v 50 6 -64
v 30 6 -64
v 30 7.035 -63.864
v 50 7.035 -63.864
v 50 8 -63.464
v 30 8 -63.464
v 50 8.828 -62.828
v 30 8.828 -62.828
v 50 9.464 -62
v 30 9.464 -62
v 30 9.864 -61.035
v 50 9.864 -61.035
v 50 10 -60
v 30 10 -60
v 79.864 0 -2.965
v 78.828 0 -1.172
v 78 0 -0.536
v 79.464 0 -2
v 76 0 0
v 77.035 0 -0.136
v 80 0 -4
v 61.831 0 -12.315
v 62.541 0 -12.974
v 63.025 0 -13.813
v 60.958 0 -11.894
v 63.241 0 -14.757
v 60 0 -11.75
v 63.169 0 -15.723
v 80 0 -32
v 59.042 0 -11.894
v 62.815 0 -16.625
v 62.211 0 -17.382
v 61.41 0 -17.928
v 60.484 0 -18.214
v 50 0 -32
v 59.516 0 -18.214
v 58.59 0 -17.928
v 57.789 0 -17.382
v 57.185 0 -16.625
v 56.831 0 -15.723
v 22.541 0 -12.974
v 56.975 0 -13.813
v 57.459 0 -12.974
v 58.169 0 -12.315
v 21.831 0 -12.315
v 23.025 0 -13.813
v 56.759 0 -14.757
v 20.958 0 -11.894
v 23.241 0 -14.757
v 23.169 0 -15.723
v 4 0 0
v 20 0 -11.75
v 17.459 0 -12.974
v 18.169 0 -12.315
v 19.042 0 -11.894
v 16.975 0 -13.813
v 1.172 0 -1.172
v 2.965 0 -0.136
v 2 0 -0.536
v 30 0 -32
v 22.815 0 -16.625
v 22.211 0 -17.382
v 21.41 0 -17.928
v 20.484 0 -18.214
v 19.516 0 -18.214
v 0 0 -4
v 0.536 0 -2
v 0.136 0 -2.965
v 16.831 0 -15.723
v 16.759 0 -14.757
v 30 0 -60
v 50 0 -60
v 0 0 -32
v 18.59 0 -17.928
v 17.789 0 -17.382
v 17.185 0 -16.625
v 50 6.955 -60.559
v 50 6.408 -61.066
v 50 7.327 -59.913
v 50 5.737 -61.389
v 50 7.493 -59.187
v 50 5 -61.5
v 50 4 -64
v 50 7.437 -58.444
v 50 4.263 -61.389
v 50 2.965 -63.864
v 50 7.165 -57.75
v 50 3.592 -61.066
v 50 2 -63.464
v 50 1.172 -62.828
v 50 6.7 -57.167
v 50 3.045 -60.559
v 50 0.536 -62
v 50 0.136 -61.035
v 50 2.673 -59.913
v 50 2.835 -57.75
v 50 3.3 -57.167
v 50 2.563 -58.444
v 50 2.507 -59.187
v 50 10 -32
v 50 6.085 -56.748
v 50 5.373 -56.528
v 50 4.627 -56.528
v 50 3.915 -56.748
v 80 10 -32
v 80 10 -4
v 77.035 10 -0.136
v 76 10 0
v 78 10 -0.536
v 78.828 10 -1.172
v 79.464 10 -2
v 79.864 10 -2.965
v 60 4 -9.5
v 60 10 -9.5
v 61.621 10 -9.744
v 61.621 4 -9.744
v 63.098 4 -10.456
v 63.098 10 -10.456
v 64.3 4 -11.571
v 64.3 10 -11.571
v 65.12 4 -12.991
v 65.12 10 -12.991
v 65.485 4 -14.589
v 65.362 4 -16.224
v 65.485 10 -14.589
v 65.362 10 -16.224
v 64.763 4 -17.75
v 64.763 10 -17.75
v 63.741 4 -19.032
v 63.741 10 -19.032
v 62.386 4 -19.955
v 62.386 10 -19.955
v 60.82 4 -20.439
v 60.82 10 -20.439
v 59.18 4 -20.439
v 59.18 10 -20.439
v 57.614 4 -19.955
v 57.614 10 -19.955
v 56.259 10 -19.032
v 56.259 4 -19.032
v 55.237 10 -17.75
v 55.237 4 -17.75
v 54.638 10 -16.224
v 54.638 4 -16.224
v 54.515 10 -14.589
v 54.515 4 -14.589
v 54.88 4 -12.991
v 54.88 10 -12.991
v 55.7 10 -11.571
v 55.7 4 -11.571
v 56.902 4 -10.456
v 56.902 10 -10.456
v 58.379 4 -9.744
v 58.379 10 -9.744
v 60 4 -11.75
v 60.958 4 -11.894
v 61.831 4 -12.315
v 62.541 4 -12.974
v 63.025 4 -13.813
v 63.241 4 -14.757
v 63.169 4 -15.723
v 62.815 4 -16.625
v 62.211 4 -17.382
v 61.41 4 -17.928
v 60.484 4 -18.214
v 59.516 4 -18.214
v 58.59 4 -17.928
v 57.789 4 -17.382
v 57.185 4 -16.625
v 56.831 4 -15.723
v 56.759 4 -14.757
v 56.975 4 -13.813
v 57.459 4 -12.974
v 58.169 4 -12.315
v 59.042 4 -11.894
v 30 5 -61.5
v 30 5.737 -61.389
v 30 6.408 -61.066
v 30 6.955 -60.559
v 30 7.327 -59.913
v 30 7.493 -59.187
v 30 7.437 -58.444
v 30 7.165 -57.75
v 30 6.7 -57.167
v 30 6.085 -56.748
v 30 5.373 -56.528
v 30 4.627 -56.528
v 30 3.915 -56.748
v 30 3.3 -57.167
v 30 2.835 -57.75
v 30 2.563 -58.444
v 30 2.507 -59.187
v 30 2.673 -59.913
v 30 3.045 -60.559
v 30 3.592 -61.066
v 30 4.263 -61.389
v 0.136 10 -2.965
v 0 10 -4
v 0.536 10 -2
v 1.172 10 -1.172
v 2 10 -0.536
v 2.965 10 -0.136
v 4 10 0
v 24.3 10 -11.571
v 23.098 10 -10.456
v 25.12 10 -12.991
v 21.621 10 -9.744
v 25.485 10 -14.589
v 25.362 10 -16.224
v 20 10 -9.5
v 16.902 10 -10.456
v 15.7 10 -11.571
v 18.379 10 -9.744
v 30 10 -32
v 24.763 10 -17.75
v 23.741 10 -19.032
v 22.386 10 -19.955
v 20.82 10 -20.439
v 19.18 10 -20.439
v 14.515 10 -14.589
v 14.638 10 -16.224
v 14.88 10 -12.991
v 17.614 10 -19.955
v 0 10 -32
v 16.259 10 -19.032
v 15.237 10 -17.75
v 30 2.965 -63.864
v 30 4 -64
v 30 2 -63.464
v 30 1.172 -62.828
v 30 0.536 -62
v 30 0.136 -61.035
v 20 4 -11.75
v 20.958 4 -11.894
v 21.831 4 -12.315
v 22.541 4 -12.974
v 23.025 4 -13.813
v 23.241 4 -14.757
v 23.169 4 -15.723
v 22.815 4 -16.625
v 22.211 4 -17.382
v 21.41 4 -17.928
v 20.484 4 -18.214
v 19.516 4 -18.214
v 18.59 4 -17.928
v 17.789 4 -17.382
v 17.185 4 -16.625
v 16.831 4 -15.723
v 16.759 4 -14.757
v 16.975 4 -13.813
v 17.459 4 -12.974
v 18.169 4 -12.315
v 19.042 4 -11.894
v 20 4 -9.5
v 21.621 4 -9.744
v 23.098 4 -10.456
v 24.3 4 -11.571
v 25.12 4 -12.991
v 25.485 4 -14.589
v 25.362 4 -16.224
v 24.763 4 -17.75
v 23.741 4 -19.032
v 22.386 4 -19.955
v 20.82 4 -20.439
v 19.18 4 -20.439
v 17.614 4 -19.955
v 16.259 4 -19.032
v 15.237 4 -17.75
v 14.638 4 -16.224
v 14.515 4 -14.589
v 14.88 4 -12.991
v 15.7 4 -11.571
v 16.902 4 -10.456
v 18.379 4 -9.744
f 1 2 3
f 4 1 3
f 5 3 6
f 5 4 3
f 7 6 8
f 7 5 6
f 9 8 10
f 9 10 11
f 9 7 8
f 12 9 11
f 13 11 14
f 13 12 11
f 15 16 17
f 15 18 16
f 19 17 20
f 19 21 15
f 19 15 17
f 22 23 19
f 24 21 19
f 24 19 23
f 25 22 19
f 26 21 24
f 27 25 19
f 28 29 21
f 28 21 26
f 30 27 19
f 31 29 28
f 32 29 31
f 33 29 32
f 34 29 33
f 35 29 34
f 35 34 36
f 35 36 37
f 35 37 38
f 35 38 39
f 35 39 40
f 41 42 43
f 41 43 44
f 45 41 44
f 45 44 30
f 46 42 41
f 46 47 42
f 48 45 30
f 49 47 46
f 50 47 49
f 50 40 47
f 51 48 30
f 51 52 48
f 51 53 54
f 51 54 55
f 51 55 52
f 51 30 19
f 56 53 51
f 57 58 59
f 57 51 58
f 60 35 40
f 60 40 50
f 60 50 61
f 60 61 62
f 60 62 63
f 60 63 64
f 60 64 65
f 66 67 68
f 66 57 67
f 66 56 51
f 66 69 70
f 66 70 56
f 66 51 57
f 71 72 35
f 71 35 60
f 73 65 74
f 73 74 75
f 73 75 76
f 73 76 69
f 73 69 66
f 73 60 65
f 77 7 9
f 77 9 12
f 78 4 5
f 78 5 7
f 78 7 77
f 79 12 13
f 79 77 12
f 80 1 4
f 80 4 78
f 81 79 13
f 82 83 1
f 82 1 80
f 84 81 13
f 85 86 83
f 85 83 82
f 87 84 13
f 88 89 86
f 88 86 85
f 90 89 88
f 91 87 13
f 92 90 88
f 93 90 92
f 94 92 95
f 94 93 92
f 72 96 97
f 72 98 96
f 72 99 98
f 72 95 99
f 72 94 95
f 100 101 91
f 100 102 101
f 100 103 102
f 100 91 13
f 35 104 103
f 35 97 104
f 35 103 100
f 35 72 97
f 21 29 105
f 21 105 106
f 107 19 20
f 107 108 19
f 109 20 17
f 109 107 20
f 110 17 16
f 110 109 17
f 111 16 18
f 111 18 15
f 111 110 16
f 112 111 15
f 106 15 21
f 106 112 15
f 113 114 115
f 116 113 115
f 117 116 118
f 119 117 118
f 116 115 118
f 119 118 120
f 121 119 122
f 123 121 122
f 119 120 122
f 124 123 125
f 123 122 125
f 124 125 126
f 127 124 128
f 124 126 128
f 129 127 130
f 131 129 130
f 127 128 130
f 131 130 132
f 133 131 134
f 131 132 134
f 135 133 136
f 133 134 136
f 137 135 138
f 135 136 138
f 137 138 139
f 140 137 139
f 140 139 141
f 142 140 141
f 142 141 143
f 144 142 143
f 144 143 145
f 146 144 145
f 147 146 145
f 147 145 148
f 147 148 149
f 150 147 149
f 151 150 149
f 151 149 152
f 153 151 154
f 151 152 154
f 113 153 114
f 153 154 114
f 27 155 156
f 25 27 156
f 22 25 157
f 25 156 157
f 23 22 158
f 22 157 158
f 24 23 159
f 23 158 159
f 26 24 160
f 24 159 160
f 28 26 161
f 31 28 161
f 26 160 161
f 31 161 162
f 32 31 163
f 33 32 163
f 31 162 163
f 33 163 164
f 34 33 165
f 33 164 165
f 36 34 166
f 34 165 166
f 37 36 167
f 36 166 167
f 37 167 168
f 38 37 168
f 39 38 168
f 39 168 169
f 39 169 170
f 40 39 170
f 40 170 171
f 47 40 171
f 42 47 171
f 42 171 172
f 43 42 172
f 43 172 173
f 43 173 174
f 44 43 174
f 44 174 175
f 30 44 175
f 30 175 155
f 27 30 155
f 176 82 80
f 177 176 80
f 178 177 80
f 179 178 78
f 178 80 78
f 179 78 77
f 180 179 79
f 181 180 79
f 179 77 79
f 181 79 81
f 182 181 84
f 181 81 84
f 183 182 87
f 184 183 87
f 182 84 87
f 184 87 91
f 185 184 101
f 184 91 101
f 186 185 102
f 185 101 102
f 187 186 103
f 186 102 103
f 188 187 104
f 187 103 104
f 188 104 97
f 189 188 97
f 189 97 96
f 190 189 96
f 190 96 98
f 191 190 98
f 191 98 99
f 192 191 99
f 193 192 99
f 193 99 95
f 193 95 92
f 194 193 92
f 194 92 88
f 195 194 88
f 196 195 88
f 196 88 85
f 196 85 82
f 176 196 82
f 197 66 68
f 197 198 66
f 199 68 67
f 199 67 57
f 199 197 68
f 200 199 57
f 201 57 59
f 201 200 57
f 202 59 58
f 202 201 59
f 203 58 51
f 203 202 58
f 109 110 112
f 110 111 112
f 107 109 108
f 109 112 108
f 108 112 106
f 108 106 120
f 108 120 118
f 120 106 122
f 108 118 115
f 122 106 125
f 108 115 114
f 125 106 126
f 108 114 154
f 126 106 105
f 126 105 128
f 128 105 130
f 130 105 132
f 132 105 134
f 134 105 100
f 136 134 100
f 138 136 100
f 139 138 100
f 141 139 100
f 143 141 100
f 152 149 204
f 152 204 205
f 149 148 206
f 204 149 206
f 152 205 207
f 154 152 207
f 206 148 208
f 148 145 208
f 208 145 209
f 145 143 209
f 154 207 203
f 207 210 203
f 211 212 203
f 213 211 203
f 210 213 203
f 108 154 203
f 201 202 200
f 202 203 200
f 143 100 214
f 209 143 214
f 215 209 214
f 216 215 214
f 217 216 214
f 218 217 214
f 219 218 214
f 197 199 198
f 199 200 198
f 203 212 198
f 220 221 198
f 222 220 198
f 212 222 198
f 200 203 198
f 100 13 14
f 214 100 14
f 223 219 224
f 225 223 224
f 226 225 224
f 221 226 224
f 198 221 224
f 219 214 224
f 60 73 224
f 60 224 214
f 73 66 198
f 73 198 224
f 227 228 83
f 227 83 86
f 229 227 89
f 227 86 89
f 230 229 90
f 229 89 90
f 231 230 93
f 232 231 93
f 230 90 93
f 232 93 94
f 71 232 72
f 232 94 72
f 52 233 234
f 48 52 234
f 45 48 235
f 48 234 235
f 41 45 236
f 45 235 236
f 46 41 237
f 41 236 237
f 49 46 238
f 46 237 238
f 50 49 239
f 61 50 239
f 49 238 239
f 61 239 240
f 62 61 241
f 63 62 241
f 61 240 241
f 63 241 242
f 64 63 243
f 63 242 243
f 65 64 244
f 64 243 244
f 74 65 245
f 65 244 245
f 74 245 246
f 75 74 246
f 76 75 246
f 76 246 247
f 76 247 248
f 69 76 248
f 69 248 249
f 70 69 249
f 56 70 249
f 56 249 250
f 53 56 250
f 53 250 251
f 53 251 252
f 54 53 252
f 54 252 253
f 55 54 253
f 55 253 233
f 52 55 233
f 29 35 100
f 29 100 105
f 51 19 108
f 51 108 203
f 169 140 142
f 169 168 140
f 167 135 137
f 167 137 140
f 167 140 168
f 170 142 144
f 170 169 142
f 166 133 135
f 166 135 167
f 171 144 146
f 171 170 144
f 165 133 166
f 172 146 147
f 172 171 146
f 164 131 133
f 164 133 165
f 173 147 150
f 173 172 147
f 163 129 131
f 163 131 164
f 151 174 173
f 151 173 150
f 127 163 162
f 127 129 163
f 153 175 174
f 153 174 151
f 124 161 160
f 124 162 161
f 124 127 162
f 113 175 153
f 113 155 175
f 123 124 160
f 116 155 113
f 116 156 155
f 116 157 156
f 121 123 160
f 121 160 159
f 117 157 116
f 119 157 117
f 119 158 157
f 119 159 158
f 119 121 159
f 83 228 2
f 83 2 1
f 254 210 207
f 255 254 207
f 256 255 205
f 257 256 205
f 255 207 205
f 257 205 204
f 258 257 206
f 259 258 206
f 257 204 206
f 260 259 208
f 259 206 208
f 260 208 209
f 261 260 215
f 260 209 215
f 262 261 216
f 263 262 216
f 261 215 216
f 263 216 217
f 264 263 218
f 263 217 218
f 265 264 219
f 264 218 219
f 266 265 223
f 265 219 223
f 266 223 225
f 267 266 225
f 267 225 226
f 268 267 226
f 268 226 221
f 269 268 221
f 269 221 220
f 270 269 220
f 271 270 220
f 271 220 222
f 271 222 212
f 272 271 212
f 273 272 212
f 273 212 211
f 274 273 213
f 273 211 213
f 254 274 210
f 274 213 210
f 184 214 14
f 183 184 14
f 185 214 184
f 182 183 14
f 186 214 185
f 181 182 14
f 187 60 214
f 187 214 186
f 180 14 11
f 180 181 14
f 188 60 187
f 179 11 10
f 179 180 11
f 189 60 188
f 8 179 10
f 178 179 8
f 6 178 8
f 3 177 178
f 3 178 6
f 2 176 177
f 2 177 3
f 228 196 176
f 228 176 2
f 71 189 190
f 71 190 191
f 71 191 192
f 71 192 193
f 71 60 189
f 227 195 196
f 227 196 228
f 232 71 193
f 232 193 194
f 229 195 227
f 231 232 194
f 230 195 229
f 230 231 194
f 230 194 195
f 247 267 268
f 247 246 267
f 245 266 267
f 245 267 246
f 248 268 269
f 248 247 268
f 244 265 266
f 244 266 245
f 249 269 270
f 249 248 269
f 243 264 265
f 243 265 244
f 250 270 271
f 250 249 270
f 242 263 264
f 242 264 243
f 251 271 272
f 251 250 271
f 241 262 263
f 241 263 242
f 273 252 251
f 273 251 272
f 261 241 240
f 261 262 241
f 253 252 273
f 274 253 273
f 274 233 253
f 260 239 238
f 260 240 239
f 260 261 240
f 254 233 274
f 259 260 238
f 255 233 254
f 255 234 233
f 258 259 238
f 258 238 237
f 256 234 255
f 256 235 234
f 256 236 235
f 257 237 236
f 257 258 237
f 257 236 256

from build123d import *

# Parameters (mm, degrees)
EXTRUDE_1_DEPTH     = 10
FILLET_1_R          = 4
SKETCH_2_R          = 2.5
CUT_EXTRUDE_1_DEPTH = 82.829090182
FILLET_2_R          = 4
SKETCH_3_R          = 5.5
CUT_EXTRUDE_2_DEPTH = 6
SKETCH_4_R          = 3.25
CUT_EXTRUDE_3_DEPTH = 103.625532885


with BuildPart() as part:
    # 스케치1 → 보스-돌출1 (new body)
    with BuildSketch(Plane(origin=(0, 0, 0), x_dir=(1, 0, 0), z_dir=(0, 1, 0))):
        Polygon((50, 32), (80, 32), (80, 0), (0, 0), (0, 32), (30, 32), (30, 64), (50, 64), align=None)
    extrude(amount=EXTRUDE_1_DEPTH)

    # 필렛1
    fillet_1_edges = [part.edges().sort_by_distance(p)[0] for p in [
        (40, 10, -64),
        (40, 0, -64),
    ]]
    fillet(fillet_1_edges, radius=FILLET_1_R)

    # 스케치2 → 컷-돌출1 (cut, through all)
    with BuildSketch(Plane(origin=(50, 0, 0), x_dir=(0, 0, -1), z_dir=(1, 0, 0))):
        with Locations((59, 5)):
            Circle(SKETCH_2_R)
    extrude(amount=-CUT_EXTRUDE_1_DEPTH, mode=Mode.SUBTRACT)

    # 필렛2
    fillet_2_edges = [part.edges().sort_by_distance(p)[0] for p in [
        (80, 5, 0),
        (0, 5, 0),
    ]]
    fillet(fillet_2_edges, radius=FILLET_2_R)

    # 스케치3 → 컷-돌출2 (cut)
    with BuildSketch(Plane(origin=(0, 10, 0), x_dir=(1, 0, 0), z_dir=(0, 1, 0))):
        with Locations(Location((20, 15, 0), (0, 0, 270))):
            Circle(SKETCH_3_R)
        with Locations(Location((60, 15, 0), (0, 0, 270))):
            Circle(SKETCH_3_R)
    extrude(amount=-CUT_EXTRUDE_2_DEPTH, mode=Mode.SUBTRACT)

    # 스케치4 → 컷-돌출3 (cut, through all)
    with BuildSketch(Plane(origin=(0, 4, 0), x_dir=(1, 0, 0), z_dir=(0, 1, 0))):
        with Locations(Location((20, 15, 0), (0, 0, 270))):
            Circle(SKETCH_4_R)
        with Locations(Location((60, 15, 0), (0, 0, 270))):
            Circle(SKETCH_4_R)
    extrude(amount=-CUT_EXTRUDE_3_DEPTH, mode=Mode.SUBTRACT)


solid = part.part
